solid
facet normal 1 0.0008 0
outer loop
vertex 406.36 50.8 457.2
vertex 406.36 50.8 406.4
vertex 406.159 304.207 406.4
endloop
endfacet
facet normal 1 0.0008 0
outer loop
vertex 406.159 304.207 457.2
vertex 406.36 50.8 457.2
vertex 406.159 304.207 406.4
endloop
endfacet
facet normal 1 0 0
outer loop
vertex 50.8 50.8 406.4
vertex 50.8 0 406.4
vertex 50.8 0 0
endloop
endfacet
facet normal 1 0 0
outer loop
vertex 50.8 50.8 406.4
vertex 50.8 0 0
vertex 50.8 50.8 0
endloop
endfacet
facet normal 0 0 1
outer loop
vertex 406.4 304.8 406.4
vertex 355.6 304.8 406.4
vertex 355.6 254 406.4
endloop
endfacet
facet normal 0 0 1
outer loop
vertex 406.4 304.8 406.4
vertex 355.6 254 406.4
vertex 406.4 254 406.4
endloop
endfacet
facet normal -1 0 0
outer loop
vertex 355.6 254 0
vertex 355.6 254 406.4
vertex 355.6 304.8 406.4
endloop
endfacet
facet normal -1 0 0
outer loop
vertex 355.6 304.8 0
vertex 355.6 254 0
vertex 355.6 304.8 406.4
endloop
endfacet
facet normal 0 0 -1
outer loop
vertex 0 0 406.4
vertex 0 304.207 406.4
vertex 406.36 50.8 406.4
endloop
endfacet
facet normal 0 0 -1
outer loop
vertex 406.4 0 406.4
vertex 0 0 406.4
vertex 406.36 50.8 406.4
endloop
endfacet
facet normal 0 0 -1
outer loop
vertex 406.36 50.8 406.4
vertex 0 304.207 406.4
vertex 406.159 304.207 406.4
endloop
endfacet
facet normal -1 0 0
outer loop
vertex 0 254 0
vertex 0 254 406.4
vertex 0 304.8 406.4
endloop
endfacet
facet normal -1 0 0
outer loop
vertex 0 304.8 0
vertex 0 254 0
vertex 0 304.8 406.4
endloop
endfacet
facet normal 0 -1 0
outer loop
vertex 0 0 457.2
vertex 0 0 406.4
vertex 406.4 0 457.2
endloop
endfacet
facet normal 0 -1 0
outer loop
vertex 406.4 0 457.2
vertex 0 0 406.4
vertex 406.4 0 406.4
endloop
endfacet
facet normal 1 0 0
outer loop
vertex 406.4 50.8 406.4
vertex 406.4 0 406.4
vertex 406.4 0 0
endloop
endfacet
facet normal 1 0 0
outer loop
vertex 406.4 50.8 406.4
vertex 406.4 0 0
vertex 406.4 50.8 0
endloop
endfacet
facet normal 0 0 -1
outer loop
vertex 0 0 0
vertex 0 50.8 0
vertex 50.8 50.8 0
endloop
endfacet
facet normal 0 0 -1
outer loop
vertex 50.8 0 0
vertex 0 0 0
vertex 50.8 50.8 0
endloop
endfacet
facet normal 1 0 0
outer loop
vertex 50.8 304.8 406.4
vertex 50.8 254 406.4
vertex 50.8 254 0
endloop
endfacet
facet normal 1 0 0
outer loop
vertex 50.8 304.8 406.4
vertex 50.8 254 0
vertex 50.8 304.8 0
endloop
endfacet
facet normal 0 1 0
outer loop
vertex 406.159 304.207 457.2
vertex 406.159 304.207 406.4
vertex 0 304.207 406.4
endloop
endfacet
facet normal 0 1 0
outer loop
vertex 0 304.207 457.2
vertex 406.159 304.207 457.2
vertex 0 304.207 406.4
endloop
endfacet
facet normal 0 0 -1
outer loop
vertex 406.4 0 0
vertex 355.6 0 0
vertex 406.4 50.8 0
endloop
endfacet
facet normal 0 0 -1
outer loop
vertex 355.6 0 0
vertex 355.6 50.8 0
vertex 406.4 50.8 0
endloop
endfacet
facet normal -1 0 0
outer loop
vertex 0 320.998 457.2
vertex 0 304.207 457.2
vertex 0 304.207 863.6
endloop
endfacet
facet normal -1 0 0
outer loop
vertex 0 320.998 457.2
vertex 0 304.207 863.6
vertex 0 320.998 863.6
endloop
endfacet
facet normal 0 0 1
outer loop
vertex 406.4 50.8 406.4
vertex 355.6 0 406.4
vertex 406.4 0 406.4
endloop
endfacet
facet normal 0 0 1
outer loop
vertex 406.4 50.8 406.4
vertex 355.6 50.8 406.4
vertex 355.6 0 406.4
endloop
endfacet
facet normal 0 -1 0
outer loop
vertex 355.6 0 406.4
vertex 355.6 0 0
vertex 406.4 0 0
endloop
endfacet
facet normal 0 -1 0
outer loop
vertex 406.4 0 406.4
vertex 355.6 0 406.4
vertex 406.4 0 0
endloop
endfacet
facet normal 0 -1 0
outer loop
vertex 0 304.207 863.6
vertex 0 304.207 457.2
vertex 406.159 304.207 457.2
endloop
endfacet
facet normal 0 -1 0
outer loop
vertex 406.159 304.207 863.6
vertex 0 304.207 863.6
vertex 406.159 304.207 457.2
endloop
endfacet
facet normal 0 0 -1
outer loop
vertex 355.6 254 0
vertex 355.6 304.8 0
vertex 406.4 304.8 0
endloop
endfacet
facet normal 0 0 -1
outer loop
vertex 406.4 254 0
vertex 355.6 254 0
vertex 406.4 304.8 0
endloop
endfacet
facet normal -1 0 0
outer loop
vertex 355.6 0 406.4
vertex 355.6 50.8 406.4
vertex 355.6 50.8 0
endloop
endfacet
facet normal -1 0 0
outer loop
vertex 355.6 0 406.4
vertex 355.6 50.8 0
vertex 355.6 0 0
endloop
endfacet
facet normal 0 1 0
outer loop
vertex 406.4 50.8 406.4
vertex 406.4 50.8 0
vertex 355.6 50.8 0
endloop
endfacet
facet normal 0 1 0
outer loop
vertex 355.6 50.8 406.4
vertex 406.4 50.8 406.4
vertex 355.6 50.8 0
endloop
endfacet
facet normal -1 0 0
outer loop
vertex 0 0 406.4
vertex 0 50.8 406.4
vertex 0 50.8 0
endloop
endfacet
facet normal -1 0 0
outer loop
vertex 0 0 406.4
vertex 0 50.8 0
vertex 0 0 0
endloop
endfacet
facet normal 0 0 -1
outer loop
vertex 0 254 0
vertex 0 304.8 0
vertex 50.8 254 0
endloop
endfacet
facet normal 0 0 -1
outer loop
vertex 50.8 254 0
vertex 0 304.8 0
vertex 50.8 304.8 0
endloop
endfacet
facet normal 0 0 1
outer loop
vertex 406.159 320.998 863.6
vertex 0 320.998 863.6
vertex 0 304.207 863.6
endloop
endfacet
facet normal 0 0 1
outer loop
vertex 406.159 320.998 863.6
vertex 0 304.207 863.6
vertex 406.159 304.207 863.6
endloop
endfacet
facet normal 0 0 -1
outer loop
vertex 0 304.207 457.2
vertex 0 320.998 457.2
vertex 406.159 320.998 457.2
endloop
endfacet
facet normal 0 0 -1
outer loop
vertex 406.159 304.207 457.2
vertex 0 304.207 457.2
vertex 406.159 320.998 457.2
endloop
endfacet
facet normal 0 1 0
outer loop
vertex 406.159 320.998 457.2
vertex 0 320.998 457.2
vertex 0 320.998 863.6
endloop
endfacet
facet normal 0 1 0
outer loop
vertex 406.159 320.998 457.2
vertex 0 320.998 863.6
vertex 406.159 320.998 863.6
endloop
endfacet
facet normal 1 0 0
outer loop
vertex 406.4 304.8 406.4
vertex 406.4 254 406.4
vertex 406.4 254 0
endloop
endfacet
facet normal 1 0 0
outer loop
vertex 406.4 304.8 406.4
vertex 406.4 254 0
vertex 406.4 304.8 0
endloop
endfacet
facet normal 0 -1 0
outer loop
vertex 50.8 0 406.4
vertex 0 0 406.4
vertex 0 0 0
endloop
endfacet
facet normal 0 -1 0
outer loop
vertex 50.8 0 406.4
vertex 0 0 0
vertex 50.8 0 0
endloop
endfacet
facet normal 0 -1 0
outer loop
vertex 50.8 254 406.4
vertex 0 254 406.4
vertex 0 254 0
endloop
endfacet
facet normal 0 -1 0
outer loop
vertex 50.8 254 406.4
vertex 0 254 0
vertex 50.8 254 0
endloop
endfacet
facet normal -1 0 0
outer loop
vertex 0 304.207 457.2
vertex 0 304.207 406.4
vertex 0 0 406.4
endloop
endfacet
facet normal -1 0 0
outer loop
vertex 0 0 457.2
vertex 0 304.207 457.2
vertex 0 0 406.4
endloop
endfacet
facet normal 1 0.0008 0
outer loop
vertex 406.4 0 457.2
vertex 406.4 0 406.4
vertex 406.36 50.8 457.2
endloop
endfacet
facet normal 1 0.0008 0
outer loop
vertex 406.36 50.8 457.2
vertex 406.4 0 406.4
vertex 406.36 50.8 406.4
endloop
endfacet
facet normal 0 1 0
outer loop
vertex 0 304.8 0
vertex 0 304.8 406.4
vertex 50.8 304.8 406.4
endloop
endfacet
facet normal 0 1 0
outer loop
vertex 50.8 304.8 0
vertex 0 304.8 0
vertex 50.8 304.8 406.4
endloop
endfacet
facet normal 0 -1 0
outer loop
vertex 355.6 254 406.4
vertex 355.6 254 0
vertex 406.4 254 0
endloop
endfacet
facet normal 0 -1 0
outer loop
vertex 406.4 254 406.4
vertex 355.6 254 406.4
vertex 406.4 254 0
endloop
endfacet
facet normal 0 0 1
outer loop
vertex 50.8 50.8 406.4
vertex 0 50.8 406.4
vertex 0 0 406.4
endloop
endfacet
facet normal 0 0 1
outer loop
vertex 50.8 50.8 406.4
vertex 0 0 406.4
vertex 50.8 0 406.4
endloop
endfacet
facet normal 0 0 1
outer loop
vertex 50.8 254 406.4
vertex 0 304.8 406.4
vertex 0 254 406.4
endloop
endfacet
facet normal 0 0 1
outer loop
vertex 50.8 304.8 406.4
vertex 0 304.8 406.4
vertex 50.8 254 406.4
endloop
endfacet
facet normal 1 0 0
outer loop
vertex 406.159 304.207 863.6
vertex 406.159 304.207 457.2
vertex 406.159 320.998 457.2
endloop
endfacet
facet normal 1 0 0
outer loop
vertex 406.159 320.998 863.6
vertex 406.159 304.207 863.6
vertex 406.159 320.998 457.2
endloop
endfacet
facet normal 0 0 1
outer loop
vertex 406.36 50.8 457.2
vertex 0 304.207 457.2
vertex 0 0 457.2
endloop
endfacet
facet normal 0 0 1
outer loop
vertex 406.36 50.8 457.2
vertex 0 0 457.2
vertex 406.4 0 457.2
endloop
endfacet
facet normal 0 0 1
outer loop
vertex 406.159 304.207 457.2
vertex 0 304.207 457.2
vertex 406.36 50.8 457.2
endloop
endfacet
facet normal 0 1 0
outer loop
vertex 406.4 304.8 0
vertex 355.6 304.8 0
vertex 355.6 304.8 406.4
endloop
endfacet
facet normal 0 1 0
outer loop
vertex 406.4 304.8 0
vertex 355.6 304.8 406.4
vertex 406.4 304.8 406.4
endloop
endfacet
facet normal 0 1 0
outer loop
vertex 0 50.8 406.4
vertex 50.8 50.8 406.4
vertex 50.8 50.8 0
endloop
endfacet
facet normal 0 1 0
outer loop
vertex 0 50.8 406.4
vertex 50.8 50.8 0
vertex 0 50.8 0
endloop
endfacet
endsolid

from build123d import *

# Parameters (mm, degrees)
F0_W     = 50.8
F0_H     = 50.8
F1_DEPTH = 406.4
F3_DEPTH = 50.8
F4_W     = 406.158894
F4_H     = 16.791105
F5_DEPTH = 406.4


with BuildPart() as f1:
    # F0 (on Top) → F1 (new body)
    with BuildSketch(Plane.XY):
        Polygon((0, 50.8), (0, 0), (50.8, 0), (50.8, 12.397157), (50.8, 50.8), align=None)
        with Locations((25.4, 279.4)):
            Rectangle(F0_W, F0_H)
        with Locations((381, 279.4)):
            Rectangle(F0_W, F0_H)
        Polygon((355.6, 12.397157), (355.6, 0), (406.4, 0), (406.4, 50.8), (355.6, 50.8), align=None)
    extrude(amount=F1_DEPTH)


with BuildPart() as f3:
    # F2 (on face) → F3 (new body)
    with BuildSketch(Plane.XY.offset(406.4)):
        Polygon((355.6, 50.8), (355.6, 0), (406.4, 0), (406.359737, 50.8), align=None)
        Polygon((0, 304.206938), (0, 0), (355.6, 0), (355.6, 50.8), (406.359737, 50.8), (406.158894, 304.206938), align=None)
    extrude(amount=F3_DEPTH)


with BuildPart() as f5:
    # F4 (on face) → F5 (new body)
    with BuildSketch(Plane.XY.offset(457.2)):
        with Locations((203.079447, 312.60249)):
            Rectangle(F4_W, F4_H)
    extrude(amount=F5_DEPTH)


solid = Compound([f1.part, f3.part, f5.part])
